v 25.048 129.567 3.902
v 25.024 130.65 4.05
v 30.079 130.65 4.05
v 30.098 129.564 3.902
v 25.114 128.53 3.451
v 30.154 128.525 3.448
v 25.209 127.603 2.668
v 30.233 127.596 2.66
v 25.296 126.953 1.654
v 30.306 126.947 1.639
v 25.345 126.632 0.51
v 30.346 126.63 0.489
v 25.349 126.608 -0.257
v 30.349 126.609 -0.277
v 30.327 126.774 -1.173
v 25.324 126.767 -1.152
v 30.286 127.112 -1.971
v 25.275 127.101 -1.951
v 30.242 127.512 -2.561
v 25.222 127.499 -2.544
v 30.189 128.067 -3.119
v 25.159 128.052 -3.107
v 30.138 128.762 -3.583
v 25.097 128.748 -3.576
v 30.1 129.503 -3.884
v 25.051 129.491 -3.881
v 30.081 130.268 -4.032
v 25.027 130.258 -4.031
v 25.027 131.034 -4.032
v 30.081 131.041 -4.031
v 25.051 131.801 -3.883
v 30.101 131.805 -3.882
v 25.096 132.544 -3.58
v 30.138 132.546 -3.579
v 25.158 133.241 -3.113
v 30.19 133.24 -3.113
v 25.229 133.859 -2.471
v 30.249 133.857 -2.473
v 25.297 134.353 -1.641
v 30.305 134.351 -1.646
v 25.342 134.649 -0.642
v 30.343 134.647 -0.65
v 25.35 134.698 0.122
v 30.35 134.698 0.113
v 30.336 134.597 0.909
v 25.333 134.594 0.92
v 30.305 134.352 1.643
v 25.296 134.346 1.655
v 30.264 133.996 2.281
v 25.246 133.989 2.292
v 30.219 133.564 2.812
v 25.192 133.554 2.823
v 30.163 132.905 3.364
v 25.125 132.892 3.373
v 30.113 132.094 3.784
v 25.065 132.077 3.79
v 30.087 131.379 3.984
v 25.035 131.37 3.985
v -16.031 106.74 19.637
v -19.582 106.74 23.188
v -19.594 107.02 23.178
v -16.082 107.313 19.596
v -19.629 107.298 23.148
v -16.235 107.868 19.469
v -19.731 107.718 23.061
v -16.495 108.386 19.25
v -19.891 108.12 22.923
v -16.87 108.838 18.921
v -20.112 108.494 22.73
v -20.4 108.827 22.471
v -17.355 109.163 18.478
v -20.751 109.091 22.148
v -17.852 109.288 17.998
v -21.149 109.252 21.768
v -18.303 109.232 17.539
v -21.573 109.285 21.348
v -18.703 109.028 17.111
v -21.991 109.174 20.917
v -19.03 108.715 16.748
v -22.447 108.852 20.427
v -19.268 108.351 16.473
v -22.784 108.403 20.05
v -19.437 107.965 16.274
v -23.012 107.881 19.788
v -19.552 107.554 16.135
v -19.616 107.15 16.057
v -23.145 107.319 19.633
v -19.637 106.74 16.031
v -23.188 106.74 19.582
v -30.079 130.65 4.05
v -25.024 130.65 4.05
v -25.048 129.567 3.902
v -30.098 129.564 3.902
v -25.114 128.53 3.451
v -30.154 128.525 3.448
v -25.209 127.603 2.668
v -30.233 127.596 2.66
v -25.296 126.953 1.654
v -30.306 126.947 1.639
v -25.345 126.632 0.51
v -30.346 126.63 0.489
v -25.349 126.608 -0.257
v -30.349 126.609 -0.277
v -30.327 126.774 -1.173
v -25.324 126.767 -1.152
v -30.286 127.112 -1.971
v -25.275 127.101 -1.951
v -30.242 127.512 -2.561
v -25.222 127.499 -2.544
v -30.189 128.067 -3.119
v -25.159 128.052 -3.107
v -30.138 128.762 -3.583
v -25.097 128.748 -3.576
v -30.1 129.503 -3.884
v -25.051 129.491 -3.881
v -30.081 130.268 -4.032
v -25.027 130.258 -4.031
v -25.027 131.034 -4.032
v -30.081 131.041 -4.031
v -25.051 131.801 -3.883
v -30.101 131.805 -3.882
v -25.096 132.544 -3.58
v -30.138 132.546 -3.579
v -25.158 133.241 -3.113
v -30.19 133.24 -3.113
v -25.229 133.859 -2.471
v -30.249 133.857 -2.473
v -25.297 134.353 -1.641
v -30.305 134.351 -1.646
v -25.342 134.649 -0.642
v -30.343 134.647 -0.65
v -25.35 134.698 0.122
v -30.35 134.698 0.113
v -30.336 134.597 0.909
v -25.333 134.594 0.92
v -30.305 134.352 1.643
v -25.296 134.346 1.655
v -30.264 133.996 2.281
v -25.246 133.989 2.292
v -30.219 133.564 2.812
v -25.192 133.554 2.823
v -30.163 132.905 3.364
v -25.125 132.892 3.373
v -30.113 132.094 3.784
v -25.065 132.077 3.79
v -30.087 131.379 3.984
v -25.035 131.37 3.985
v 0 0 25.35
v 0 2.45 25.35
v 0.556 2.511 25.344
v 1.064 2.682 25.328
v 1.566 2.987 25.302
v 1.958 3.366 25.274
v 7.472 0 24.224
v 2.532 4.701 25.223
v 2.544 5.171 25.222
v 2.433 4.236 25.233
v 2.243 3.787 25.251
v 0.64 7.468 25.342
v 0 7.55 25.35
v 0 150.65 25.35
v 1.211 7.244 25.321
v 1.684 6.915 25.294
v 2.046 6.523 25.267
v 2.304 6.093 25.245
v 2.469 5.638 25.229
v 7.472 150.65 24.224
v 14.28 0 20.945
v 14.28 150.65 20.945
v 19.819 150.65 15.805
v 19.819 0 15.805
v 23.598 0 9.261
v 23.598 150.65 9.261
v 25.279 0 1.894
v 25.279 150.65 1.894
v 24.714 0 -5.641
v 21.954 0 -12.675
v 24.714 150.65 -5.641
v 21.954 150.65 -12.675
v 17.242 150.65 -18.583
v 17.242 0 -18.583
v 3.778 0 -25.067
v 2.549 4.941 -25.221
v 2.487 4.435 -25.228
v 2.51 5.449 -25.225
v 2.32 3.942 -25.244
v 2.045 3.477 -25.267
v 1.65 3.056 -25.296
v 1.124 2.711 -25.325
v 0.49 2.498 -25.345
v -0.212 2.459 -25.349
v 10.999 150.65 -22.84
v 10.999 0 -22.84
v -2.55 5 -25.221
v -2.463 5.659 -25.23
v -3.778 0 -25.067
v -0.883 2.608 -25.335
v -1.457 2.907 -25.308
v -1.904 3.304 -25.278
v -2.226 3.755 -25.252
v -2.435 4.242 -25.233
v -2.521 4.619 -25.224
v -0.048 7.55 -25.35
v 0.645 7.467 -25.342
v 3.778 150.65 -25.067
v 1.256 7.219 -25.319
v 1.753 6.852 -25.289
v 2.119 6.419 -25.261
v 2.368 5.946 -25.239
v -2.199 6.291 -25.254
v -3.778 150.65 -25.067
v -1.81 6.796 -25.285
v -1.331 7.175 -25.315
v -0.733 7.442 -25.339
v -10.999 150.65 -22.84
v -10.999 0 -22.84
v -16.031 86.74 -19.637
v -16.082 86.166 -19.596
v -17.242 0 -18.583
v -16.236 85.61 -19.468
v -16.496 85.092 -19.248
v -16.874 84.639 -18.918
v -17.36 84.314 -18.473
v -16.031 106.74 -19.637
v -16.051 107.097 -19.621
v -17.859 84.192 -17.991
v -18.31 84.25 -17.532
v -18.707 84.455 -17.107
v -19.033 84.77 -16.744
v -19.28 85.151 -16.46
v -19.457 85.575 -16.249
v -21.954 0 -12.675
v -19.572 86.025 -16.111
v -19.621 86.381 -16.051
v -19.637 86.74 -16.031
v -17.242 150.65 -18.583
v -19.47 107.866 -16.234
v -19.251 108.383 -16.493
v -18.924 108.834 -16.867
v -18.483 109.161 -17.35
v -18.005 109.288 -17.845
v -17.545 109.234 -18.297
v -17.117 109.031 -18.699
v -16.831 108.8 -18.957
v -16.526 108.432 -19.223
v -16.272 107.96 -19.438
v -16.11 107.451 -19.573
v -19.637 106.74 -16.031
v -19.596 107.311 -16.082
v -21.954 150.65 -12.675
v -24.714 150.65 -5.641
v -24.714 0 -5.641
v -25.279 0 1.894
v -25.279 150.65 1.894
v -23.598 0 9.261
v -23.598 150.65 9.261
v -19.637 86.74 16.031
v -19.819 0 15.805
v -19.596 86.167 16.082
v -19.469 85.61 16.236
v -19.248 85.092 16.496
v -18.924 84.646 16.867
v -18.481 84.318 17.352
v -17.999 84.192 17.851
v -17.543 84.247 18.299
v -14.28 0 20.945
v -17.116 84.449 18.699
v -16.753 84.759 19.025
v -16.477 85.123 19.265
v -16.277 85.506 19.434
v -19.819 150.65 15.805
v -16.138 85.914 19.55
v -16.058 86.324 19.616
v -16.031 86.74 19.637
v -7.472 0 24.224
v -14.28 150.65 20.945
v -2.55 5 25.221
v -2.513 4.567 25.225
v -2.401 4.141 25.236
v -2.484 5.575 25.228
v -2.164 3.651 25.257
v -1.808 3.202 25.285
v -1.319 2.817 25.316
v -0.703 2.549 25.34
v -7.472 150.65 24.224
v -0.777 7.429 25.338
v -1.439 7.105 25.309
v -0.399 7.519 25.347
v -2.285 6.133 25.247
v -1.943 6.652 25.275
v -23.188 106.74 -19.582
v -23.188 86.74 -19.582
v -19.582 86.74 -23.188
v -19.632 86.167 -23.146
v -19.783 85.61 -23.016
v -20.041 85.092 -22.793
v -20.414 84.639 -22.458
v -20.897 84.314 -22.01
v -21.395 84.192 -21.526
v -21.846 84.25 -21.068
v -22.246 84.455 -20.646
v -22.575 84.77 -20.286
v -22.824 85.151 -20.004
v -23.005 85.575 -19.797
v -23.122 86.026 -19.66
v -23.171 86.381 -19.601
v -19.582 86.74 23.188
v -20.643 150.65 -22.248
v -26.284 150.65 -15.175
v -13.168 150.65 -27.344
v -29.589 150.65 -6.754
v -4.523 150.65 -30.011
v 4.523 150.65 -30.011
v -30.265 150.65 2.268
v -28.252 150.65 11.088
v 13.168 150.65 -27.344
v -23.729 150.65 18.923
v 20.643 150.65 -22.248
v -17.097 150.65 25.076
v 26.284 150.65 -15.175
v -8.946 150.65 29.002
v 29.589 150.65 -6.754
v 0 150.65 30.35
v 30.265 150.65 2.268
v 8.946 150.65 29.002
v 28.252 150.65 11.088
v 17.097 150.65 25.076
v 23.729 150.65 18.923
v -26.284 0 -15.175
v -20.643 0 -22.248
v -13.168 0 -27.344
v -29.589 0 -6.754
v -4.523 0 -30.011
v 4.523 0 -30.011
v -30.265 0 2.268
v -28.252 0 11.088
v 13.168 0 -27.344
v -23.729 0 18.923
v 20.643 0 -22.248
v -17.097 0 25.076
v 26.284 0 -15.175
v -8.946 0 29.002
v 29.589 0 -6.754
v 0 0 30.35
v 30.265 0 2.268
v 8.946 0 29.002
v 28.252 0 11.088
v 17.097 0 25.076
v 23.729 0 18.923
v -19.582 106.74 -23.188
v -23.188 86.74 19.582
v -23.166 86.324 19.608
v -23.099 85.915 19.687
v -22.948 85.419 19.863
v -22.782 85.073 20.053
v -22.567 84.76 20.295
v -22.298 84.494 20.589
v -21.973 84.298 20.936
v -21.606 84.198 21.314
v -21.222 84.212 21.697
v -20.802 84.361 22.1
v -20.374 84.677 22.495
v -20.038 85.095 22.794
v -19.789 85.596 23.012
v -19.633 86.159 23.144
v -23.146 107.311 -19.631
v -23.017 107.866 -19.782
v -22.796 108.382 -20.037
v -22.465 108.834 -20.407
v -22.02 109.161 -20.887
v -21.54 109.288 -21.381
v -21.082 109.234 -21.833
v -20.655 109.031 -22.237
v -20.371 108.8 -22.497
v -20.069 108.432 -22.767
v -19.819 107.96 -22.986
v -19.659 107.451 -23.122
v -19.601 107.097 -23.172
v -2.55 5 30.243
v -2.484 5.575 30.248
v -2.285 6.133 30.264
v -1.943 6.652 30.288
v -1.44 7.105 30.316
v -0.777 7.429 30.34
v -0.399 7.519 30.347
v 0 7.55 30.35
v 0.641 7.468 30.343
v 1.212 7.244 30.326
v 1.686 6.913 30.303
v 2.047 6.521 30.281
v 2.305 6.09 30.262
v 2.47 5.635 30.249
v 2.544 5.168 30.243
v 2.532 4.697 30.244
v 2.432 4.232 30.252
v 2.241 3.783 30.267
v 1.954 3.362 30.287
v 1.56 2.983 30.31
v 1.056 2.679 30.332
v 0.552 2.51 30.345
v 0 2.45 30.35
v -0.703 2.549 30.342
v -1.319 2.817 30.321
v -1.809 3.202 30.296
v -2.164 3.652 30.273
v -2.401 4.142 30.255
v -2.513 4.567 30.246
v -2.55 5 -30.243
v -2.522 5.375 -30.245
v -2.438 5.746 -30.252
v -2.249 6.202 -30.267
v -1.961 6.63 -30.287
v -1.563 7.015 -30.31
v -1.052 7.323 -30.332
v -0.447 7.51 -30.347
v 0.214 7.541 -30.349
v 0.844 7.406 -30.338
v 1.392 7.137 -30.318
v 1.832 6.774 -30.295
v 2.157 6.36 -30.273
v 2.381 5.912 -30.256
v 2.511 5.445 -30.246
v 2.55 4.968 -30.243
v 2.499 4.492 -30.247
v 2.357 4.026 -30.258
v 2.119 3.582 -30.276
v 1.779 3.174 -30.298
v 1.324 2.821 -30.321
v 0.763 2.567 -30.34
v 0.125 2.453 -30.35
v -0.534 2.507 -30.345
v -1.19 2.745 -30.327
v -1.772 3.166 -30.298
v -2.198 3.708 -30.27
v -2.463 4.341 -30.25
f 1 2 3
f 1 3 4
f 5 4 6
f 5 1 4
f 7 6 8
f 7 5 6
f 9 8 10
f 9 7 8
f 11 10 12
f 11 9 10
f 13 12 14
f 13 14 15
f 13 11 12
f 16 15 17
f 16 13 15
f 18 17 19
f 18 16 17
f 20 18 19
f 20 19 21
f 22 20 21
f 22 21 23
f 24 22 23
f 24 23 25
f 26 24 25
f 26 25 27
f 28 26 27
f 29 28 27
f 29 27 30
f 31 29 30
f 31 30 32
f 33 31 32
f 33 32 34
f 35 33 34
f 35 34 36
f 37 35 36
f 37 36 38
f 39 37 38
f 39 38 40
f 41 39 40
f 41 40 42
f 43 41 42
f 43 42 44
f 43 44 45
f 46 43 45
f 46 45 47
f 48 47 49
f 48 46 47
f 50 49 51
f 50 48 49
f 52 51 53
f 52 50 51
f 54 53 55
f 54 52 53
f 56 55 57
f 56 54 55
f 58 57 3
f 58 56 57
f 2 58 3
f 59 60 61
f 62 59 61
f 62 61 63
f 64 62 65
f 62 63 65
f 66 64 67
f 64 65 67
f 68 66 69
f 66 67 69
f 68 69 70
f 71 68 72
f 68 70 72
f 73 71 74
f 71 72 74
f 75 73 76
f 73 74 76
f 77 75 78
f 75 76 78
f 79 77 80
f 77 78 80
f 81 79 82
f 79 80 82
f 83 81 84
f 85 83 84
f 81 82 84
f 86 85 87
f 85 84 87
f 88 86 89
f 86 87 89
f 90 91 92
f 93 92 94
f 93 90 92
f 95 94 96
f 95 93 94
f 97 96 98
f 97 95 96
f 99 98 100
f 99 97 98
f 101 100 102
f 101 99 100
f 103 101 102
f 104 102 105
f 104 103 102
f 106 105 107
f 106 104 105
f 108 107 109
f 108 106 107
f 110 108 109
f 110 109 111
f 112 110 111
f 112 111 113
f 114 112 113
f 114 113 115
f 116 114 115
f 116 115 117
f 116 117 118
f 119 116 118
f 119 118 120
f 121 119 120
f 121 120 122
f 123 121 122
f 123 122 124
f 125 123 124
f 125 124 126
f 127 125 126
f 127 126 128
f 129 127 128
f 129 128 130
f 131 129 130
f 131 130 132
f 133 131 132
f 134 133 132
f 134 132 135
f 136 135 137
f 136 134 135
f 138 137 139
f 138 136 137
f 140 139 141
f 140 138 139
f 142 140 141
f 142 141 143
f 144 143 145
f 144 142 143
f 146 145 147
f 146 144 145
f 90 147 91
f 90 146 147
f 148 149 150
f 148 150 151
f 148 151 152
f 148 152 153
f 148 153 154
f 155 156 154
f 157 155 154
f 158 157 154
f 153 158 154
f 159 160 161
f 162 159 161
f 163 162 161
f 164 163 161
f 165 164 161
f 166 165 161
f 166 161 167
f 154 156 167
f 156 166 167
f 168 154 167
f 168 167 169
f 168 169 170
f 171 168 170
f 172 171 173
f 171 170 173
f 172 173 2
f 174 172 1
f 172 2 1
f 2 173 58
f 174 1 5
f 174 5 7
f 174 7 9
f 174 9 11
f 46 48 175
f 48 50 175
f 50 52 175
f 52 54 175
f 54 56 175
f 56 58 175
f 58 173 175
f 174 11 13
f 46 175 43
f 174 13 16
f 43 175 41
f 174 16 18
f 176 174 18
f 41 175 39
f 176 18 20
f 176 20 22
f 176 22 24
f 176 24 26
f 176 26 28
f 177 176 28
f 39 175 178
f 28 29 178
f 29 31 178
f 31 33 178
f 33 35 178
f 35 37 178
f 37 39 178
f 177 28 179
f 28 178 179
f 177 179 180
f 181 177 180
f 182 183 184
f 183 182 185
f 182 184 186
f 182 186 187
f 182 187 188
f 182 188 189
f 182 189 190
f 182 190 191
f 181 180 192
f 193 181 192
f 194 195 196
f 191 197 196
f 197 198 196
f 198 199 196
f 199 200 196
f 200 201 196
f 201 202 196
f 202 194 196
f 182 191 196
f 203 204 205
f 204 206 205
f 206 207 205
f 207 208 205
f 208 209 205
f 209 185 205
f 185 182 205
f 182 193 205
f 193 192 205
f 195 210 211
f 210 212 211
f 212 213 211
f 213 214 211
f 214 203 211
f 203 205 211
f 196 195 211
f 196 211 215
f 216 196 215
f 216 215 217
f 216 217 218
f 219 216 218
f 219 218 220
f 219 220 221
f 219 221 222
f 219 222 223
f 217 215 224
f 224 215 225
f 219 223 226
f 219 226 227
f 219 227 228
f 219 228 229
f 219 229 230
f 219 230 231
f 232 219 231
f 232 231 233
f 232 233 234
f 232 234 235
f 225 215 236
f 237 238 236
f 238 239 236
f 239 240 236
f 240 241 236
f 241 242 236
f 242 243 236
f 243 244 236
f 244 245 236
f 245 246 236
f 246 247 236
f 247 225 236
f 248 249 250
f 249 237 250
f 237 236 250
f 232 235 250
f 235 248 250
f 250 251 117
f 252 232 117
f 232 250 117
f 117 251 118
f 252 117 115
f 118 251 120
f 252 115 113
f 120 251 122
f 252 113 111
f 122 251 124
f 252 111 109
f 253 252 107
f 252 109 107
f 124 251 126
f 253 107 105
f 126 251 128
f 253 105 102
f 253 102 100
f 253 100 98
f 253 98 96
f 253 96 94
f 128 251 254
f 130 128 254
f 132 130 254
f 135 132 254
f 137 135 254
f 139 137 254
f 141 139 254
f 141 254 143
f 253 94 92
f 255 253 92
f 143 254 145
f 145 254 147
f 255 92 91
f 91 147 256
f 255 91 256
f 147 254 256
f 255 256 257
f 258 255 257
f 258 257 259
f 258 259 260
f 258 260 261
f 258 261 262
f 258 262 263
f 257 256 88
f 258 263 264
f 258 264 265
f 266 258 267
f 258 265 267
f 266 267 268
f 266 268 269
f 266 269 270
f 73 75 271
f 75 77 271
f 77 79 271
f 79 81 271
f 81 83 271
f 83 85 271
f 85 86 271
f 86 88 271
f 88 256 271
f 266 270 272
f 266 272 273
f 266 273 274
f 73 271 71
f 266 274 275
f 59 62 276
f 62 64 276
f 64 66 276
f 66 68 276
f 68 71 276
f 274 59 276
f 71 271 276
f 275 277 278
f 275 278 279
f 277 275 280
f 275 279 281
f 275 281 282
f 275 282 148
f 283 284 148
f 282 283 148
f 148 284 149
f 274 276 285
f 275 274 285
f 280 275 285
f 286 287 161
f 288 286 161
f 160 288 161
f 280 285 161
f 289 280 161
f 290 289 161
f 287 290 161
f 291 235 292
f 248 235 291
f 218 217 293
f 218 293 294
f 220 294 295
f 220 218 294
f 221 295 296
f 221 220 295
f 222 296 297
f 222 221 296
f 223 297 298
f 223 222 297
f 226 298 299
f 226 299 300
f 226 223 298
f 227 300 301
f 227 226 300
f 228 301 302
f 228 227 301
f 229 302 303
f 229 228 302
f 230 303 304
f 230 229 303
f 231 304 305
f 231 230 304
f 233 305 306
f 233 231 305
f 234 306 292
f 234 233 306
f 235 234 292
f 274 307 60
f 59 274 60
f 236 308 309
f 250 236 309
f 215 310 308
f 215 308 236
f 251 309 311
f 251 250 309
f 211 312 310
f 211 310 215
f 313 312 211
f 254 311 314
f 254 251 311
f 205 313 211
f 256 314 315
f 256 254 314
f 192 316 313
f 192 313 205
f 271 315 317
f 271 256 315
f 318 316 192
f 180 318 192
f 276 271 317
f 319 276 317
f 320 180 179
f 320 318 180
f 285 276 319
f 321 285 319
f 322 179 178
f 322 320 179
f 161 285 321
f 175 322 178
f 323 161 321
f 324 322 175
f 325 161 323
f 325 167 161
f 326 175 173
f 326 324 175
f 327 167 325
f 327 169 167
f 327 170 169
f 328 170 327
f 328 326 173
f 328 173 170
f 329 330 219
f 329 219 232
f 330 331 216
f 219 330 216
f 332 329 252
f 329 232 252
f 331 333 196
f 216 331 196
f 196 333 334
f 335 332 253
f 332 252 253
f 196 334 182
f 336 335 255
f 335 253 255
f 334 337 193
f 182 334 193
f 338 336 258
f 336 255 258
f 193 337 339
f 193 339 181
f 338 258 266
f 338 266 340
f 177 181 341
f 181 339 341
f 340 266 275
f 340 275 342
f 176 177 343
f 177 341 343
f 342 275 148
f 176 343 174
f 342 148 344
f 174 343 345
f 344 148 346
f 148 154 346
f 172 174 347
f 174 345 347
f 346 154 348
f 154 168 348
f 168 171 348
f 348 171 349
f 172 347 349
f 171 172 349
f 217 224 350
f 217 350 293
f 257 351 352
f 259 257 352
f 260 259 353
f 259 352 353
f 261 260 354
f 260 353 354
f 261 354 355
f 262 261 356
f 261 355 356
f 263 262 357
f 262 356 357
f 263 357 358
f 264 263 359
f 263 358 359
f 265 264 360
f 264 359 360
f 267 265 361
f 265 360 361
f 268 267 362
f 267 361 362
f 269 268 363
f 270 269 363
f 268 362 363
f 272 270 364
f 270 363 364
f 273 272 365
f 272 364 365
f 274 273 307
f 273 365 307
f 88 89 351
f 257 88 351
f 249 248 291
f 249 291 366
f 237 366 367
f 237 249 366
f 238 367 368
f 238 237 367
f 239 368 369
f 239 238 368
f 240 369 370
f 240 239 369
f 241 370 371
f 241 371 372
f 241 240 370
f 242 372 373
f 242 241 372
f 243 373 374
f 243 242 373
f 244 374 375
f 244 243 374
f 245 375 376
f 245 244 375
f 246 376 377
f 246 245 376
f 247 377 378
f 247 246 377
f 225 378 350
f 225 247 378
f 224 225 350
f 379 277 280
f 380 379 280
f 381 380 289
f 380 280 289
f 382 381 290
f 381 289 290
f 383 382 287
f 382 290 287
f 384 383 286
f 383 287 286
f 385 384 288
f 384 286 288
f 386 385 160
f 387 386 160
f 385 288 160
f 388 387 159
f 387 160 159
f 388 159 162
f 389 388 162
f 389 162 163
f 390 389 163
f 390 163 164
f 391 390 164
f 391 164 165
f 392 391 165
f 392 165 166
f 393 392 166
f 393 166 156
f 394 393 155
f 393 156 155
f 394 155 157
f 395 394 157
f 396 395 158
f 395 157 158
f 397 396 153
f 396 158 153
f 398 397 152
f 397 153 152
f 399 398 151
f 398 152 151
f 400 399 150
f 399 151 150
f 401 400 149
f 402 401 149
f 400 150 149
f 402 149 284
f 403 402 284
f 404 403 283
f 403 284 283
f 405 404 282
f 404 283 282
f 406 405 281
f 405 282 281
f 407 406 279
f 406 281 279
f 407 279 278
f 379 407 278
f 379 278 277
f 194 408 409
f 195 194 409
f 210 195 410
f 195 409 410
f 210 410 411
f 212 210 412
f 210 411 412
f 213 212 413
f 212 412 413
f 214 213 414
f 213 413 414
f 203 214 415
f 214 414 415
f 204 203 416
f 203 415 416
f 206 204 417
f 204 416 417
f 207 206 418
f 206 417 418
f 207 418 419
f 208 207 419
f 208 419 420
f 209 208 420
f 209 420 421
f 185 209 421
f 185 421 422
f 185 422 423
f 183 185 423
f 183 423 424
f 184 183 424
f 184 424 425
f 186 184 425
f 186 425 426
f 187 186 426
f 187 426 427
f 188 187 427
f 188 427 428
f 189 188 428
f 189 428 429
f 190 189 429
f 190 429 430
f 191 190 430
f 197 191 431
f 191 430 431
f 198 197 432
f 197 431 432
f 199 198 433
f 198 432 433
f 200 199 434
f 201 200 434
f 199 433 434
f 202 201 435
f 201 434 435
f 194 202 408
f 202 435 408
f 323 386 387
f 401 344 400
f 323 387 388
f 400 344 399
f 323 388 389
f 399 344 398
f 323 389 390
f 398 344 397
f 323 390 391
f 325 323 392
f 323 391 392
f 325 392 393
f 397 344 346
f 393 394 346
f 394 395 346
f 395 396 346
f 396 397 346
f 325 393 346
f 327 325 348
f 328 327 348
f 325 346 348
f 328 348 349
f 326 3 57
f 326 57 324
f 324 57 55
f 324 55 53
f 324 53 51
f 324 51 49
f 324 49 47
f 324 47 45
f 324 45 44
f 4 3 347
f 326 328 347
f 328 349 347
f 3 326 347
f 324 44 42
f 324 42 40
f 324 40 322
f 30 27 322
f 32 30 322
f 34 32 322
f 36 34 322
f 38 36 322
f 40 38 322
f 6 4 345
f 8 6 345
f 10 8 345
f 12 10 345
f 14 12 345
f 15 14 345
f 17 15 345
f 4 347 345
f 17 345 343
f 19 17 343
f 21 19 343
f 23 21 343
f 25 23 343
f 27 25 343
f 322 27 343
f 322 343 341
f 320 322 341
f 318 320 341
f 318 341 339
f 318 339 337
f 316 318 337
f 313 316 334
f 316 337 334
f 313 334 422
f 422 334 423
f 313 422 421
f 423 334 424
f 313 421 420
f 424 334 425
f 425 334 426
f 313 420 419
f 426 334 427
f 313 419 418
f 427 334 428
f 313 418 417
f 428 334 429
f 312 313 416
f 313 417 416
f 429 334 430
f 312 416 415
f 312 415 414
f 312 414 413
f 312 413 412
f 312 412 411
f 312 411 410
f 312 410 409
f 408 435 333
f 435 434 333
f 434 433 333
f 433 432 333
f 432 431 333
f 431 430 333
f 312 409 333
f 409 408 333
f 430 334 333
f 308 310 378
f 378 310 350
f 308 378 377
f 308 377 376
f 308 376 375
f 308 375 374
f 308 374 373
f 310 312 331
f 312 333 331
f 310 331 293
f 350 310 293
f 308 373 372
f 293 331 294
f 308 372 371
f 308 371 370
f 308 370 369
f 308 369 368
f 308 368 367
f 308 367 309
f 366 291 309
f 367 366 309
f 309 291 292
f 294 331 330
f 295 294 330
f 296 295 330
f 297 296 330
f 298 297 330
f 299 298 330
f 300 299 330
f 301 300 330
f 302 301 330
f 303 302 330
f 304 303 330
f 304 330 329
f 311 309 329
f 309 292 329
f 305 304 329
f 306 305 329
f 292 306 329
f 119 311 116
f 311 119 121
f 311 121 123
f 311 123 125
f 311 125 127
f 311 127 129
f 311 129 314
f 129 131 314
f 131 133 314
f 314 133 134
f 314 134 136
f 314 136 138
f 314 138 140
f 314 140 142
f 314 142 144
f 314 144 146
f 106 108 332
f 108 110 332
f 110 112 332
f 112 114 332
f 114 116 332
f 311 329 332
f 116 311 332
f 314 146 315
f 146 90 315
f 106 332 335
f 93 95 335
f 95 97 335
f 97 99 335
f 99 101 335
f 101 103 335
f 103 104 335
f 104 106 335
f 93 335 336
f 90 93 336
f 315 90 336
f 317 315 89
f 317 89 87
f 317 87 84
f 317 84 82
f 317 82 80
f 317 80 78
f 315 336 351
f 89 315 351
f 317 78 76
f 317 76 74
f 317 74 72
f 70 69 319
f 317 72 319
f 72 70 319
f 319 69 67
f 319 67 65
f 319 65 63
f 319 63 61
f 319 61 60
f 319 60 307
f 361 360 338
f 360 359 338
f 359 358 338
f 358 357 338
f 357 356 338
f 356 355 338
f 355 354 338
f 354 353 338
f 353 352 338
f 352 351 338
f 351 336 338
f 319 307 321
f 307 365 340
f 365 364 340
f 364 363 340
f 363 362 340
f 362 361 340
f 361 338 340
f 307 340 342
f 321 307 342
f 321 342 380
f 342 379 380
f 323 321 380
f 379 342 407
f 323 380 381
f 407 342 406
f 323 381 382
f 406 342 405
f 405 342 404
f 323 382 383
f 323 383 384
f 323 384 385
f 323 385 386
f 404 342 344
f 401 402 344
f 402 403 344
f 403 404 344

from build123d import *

# Parameters (mm, degrees)
SKETCH1_R               = 30.35
BOSS_EXTRUDE1_DEPTH     = 10
SKETCH2_R               = 30.35
BOSS_EXTRUDE2_DEPTH     = 140.65
SKETCH4_R               = 25.35
CUT_EXTRUDE1_DEPTH      = 308.65
SKETCH6_R               = 2.55
CUT_EXTRUDE3_DEPTH      = 90
CUT_EXTRUDE4_START      = -6
CUT_EXTRUDE4_DEPTH      = 7
CUT_EXTRUDE5_DEPTH      = 10
CUT_EXTRUDE6_DEPTH      = 137
CUT_EXTRUDE6_DEPTH_BACK = 137
SKETCH10_R              = 4.05


with BuildPart() as part:
    # Sketch1 → Boss-Extrude1 (new body)
    with BuildSketch(Plane(origin=(0, 0, 0), x_dir=(1, 0, 0), z_dir=(0, 1, 0))):
        with Locations(Location((0, 0, 0), (0, 0, 270))):
            Circle(SKETCH1_R)
    extrude(amount=BOSS_EXTRUDE1_DEPTH)

    # Sketch2 → Boss-Extrude2 (add)
    with BuildSketch(Plane(origin=(0, 10, 0), x_dir=(1, 0, 0), z_dir=(0, 1, 0))):
        with Locations(Location((0, 0, 0), (0, 0, 270))):
            Circle(SKETCH2_R)
    extrude(amount=BOSS_EXTRUDE2_DEPTH)

    # Sketch4 → Cut-Extrude1 (cut)
    with BuildSketch(Plane(origin=(0, 150.65, 0), x_dir=(1, 0, 0), z_dir=(0, 1, 0))):
        with Locations(Location((0, 0, 0), (0, 0, 270))):
            Circle(SKETCH4_R)
    extrude(amount=-CUT_EXTRUDE1_DEPTH, mode=Mode.SUBTRACT)

    # Sketch6 → Cut-Extrude3 (cut)
    with BuildSketch(Plane(origin=(0, 0, -30.35), x_dir=(-1, 0, 0), z_dir=(0, 0, -1))):
        with Locations((0, 5)):
            Circle(SKETCH6_R)
    extrude(amount=-CUT_EXTRUDE3_DEPTH, mode=Mode.SUBTRACT)

    # Cut-Extrude4: read off the stored shape, not the designer's step
    # Cut-Extrude4 outline → Cut-Extrude4 (cut)
    with BuildSketch(Plane(origin=(-21.460690809, 0, -21.460690809), x_dir=(0, -1, 0), z_dir=(-0.7071067811865417, 0, -0.7071067811865533)).offset(CUT_EXTRUDE4_START)):
        with BuildLine():
            ThreePointArc((-106.74, 2.55), (-109.29, 0), (-106.74, -2.55))
            Line((-106.74, -2.55), (-86.74, -2.55))
            ThreePointArc((-86.74, -2.55), (-84.19, 0), (-86.74, 2.55))
            Line((-86.74, 2.55), (-106.74, 2.55))
        make_face()
    extrude(amount=CUT_EXTRUDE4_DEPTH, mode=Mode.SUBTRACT)

    # Sketch9 → Cut-Extrude5 (cut)
    with BuildSketch(Plane(origin=(-21.460690809, 0, 21.460690809), x_dir=(0, -1, 0), z_dir=(-0.7071067811865512, 0, 0.7071067811865438))):
        with BuildLine():
            Line((-86.74, 2.55), (-106.74, 2.55))
            ThreePointArc((-106.74, 2.55), (-109.29, 0), (-106.74, -2.55))
            Line((-106.74, -2.55), (-86.74, -2.55))
            ThreePointArc((-86.74, -2.55), (-84.19, 0), (-86.74, 2.55))
        make_face()
    extrude(amount=-CUT_EXTRUDE5_DEPTH, mode=Mode.SUBTRACT)

    # Sketch10 → Cut-Extrude6 (cut, two sides: drawn at the far end of the back side and taken through both)
    with BuildSketch(Plane(origin=(0, 0, 0), x_dir=(0, 0, -1), z_dir=(1, 0, 0)).offset(-CUT_EXTRUDE6_DEPTH_BACK)):
        with Locations(Location((0, 130.65, 0), (0, 0, 180))):
            Circle(SKETCH10_R)
    extrude(amount=CUT_EXTRUDE6_DEPTH + CUT_EXTRUDE6_DEPTH_BACK, mode=Mode.SUBTRACT)


solid = part.part
